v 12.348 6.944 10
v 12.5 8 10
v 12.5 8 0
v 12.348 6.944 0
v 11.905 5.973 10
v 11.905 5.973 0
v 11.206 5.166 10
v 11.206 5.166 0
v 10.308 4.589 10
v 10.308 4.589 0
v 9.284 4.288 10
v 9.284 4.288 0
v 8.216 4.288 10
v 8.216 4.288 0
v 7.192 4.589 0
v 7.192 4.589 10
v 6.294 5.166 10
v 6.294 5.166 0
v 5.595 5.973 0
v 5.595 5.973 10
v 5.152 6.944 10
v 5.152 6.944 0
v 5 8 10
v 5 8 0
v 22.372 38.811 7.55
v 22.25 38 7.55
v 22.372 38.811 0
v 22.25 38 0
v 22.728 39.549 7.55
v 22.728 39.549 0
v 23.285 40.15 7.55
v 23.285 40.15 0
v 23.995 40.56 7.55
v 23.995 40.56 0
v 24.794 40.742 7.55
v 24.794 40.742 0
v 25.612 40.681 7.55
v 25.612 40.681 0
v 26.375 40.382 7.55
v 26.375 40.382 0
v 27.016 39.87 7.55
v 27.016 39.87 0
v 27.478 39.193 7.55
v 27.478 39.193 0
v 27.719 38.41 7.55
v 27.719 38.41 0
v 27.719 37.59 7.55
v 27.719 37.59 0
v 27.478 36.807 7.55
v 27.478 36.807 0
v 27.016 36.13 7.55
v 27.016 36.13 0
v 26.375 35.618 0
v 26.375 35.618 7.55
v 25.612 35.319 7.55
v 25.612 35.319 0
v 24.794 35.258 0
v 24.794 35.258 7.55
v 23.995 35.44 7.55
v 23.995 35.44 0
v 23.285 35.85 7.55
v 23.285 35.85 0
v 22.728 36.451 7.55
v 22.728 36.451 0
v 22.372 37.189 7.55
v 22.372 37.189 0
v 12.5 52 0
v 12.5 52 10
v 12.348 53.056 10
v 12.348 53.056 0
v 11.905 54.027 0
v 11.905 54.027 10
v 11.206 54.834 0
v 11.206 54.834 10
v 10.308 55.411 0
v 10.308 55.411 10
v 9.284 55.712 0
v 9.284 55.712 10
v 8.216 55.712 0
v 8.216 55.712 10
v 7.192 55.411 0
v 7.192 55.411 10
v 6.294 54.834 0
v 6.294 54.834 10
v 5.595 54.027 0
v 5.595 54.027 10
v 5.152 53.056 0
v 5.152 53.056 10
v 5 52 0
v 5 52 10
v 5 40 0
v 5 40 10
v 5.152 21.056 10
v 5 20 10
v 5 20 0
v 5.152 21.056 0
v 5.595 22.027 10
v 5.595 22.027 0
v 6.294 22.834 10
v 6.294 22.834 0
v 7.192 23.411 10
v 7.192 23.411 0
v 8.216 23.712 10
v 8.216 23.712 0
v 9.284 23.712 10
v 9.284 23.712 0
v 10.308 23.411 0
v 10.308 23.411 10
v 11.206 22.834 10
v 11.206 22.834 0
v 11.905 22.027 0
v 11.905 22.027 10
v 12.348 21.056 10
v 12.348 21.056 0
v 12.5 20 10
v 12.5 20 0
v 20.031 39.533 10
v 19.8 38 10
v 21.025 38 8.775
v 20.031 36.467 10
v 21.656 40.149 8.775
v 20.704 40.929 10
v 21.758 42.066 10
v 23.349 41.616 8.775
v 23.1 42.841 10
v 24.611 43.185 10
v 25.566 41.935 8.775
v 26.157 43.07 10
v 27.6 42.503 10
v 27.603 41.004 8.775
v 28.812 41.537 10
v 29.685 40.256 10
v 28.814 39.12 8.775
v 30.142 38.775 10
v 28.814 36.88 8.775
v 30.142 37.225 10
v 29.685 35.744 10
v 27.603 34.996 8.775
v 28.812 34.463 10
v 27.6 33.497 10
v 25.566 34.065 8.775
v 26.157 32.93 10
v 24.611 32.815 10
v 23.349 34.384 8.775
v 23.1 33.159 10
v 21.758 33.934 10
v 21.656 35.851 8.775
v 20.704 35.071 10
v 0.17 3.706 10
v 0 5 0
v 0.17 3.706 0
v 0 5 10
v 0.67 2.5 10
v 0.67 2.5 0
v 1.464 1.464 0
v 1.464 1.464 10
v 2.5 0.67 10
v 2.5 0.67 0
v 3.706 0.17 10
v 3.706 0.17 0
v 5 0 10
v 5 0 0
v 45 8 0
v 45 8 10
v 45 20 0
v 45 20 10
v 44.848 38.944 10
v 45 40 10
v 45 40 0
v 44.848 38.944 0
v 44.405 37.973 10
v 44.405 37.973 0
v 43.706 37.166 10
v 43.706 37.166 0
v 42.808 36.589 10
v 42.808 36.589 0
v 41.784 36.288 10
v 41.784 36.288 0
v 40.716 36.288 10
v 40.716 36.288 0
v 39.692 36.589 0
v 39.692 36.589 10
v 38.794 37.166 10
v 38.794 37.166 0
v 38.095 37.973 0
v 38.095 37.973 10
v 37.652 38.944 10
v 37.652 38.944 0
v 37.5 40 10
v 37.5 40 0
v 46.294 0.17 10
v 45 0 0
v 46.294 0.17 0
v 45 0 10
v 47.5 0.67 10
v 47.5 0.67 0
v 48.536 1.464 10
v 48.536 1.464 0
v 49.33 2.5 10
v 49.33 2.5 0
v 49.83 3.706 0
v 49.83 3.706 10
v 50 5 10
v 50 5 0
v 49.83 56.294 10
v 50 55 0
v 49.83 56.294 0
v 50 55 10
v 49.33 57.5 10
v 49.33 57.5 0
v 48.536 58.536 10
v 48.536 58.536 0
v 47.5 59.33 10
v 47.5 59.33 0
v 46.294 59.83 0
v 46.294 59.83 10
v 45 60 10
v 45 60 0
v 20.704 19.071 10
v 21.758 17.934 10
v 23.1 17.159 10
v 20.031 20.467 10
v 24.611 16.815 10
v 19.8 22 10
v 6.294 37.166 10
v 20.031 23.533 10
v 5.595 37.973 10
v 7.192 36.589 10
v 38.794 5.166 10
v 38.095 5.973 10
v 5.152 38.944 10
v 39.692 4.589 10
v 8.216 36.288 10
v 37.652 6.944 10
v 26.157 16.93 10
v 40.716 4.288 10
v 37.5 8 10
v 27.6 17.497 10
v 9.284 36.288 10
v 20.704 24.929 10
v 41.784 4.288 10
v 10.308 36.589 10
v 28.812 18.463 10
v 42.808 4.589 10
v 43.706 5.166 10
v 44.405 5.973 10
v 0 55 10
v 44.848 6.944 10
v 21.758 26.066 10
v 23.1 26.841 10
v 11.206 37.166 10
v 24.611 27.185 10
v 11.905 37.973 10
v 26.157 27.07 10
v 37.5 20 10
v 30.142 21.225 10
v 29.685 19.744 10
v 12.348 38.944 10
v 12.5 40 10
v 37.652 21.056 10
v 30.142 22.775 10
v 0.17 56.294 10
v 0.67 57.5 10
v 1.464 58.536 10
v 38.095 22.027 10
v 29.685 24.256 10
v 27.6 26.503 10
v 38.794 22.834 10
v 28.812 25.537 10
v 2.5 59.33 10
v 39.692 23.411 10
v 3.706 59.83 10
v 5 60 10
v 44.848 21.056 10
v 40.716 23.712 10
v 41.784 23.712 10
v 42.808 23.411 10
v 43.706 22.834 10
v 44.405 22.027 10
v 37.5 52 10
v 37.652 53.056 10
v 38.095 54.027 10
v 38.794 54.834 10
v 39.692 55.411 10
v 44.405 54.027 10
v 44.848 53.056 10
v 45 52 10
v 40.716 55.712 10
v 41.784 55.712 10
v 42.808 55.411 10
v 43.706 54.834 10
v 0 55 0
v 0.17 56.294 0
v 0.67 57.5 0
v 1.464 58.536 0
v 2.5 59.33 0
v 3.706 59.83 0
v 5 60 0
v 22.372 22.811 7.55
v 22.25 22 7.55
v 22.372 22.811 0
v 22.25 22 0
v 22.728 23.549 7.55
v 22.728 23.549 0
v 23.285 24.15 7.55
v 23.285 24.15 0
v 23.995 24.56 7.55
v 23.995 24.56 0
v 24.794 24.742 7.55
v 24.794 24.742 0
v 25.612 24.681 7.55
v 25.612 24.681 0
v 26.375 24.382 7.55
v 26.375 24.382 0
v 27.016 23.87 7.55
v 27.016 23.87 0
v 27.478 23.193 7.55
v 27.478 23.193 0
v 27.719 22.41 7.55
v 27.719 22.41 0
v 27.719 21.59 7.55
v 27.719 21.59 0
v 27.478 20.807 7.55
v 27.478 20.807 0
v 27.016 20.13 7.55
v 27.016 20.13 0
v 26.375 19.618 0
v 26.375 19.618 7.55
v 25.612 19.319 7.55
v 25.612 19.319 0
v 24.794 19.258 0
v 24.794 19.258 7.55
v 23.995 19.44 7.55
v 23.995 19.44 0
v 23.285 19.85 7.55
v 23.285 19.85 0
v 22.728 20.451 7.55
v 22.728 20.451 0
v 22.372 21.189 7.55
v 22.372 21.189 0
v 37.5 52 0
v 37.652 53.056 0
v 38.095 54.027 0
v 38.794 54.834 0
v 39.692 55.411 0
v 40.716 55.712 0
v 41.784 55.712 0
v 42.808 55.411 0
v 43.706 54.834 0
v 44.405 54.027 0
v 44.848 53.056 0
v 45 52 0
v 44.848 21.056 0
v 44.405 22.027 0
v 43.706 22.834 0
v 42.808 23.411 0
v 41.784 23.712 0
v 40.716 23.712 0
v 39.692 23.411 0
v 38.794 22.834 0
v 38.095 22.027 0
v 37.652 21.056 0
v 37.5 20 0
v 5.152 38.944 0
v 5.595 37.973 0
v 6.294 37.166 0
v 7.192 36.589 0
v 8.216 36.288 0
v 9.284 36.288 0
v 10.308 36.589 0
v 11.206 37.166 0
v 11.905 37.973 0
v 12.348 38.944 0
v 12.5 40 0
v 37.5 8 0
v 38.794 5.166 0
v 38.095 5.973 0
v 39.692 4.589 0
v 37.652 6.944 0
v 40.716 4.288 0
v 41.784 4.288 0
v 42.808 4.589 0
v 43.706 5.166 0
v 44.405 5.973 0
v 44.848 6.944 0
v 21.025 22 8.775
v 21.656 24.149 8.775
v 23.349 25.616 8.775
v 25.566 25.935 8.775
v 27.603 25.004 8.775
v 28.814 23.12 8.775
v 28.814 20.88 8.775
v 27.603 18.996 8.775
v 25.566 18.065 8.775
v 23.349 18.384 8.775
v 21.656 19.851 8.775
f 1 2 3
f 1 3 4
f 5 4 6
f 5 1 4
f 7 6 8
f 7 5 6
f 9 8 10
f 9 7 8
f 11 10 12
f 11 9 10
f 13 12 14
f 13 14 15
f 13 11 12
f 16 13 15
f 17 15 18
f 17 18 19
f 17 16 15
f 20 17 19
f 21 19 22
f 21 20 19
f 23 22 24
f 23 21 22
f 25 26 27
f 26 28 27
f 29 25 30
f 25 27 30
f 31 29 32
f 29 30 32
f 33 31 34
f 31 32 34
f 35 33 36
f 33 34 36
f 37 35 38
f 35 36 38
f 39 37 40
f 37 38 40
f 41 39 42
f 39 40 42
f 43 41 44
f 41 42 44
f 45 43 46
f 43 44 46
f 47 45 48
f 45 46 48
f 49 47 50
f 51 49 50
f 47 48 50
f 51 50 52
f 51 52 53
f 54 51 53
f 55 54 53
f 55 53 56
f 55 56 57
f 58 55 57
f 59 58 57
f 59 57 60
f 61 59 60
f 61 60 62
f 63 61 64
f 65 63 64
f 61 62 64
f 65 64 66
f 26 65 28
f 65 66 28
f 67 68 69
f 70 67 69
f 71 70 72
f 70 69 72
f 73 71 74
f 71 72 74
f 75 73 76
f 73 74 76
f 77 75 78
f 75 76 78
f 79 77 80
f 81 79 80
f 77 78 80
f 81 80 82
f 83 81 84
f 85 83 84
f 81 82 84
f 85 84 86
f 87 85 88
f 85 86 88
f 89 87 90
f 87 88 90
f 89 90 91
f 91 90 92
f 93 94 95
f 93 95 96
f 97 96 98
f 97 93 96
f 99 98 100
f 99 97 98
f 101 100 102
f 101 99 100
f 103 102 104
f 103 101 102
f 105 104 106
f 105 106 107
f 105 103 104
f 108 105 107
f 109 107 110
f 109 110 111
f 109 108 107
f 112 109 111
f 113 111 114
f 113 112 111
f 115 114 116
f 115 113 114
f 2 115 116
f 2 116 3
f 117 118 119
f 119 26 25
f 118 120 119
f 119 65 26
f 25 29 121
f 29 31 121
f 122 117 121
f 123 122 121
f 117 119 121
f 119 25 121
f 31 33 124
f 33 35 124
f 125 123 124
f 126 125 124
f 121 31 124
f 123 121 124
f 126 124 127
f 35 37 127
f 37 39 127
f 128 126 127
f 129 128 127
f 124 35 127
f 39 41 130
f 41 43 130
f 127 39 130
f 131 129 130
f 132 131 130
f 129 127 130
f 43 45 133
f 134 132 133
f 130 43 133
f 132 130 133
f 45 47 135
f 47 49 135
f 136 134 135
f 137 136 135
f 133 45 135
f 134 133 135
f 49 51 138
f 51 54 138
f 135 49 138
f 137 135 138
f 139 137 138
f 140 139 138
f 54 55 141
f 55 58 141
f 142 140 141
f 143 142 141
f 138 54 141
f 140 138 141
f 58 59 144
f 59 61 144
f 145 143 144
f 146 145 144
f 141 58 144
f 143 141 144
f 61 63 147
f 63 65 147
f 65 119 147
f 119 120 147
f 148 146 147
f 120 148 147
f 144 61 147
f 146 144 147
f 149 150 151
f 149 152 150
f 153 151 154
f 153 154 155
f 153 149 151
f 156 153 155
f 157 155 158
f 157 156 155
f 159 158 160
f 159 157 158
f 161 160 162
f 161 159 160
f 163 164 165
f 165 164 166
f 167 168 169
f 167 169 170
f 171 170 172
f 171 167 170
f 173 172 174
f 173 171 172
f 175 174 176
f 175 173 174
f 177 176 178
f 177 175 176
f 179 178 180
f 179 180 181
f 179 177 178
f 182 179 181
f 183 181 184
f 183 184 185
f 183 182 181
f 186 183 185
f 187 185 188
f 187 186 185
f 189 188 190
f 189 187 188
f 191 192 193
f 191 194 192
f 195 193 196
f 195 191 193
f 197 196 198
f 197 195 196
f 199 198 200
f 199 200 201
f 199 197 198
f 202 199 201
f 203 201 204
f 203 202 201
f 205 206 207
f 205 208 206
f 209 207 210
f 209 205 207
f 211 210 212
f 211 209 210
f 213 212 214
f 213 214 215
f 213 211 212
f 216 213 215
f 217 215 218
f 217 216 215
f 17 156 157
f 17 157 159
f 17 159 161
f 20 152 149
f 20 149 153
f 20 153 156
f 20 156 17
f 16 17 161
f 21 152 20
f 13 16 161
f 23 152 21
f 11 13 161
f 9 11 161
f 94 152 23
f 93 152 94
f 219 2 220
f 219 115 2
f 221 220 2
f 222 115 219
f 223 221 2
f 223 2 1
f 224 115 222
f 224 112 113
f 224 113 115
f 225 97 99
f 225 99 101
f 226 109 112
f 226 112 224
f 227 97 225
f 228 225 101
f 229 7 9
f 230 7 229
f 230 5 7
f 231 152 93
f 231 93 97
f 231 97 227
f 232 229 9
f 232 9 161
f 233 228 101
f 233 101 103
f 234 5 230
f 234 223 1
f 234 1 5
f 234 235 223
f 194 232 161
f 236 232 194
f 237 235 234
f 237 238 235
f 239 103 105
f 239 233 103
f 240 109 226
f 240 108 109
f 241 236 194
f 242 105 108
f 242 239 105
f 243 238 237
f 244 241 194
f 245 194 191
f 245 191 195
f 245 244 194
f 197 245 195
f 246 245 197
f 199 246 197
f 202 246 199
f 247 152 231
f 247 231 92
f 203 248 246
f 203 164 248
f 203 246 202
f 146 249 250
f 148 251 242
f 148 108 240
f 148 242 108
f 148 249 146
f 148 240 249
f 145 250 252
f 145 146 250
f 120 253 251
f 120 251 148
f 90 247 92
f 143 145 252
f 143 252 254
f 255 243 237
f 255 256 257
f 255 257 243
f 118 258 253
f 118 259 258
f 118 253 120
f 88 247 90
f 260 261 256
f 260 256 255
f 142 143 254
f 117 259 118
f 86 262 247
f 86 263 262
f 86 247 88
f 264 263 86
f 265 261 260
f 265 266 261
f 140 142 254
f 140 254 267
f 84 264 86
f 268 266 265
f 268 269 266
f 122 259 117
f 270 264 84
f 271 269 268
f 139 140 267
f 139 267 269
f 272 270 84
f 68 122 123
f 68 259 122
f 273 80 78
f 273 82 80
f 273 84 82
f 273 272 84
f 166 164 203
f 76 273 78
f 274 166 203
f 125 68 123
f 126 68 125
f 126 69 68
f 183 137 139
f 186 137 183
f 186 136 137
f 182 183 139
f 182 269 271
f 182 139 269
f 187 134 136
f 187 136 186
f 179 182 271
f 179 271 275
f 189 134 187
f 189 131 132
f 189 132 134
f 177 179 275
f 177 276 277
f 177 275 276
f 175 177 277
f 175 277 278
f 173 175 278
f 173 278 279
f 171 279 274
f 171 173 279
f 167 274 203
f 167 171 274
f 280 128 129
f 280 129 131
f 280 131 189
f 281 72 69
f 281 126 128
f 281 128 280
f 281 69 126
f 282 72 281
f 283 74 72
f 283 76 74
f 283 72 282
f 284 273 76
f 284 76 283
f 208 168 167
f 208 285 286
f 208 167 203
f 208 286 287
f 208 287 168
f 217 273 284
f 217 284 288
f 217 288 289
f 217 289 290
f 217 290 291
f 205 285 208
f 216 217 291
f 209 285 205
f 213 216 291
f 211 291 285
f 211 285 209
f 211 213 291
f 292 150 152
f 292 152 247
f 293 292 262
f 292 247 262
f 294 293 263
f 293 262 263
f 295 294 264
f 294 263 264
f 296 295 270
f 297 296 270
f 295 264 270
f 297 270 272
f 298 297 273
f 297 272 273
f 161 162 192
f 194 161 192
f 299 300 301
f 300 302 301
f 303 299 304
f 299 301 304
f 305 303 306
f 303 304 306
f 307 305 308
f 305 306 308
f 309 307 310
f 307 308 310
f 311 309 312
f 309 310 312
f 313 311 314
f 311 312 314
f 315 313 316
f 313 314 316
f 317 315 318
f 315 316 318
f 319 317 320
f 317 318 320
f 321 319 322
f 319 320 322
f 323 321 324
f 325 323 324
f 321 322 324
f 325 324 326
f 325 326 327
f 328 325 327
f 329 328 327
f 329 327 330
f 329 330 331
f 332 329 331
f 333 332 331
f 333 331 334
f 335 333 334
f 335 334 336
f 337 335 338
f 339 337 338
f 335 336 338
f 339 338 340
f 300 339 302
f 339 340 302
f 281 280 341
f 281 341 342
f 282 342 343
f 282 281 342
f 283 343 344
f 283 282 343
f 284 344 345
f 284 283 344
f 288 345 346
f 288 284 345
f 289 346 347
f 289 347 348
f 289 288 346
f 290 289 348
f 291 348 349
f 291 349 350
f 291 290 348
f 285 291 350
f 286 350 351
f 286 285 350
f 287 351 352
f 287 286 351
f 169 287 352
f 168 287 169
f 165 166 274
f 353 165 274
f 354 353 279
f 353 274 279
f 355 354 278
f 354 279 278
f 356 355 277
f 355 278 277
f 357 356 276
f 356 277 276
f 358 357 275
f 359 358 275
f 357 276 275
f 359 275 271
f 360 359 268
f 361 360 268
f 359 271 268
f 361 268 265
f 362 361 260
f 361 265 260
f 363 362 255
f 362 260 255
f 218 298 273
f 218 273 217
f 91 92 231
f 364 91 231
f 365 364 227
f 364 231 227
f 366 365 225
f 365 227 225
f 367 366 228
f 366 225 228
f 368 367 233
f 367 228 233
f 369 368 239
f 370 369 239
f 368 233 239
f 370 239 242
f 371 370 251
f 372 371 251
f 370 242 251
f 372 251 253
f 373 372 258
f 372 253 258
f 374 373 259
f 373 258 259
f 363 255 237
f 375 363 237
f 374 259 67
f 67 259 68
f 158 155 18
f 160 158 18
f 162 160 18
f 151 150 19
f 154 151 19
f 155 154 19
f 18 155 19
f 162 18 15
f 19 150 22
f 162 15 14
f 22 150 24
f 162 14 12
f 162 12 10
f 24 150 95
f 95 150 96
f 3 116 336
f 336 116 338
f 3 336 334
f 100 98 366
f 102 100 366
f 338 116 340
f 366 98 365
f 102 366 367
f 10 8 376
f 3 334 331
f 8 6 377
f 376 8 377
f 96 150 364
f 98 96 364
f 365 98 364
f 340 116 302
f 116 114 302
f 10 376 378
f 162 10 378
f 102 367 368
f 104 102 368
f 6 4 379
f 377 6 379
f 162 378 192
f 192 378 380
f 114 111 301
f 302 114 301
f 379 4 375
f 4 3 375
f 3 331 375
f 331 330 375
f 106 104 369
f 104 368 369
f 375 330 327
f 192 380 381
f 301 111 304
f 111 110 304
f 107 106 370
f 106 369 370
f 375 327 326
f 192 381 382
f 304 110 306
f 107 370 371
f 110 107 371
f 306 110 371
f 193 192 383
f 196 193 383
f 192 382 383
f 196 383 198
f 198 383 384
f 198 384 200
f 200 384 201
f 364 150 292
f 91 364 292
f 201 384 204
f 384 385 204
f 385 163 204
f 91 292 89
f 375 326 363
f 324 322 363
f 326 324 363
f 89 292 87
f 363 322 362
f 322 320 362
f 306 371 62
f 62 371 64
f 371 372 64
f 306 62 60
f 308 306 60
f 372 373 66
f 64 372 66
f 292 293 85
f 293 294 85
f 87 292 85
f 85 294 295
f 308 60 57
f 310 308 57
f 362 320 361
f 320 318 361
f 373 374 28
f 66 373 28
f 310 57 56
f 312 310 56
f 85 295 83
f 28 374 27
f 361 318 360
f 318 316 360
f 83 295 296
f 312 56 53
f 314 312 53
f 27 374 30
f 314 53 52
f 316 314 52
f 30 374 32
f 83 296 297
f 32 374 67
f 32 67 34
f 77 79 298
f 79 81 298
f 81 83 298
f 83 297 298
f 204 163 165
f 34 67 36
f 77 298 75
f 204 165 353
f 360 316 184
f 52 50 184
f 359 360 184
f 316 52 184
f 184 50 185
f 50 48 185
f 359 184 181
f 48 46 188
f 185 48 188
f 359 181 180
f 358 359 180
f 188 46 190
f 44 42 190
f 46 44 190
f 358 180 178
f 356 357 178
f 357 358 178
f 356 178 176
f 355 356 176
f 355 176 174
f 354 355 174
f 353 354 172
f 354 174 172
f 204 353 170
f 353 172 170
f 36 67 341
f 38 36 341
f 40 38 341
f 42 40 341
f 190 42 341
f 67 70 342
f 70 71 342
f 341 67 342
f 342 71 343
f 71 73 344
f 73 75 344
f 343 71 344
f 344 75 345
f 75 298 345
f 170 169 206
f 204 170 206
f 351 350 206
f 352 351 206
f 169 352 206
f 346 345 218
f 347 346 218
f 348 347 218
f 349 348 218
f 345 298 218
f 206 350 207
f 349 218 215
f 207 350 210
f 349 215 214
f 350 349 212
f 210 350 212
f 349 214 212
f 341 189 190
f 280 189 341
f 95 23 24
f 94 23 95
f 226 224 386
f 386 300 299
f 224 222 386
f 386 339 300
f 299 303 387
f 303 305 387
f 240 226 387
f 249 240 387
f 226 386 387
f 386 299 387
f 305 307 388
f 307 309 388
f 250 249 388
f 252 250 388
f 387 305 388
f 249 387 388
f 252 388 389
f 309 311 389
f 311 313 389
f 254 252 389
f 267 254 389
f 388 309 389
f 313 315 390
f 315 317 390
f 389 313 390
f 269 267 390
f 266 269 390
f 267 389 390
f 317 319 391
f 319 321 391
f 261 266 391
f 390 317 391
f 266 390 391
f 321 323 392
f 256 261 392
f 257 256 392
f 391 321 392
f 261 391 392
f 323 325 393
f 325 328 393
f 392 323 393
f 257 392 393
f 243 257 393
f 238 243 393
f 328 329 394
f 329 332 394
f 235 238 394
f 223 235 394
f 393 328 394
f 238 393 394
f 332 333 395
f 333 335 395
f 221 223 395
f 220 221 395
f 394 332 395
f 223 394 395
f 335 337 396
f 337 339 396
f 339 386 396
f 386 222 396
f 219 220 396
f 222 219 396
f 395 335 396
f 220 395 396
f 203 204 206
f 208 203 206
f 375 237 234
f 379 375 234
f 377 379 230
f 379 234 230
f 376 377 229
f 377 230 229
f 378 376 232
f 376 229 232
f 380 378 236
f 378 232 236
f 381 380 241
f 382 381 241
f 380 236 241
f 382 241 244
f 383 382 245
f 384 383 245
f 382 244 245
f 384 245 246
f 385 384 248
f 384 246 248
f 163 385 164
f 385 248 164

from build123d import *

# Parameters (mm, degrees)
SKETCH1_W                                     = 50
SKETCH1_H                                     = 60
BOSS_EXTRUDE1_DEPTH                           = 10
FILLET1_R                                     = 5
CUT_EXTRUDE1_DEPTH                            = 10
CSK_FOR_M5_COUNTERSUNK_FLAT_HEAD1_D           = 5.5
CSK_FOR_M5_COUNTERSUNK_FLAT_HEAD1_DEPTH       = 30
CSK_FOR_M5_COUNTERSUNK_FLAT_HEAD1_CSINK_D     = 10.4
CSK_FOR_M5_COUNTERSUNK_FLAT_HEAD1_CSINK_ANGLE = 90
CSK_FOR_M5_COUNTERSUNK_FLAT_HEAD1_TIP         = 1.652366702


with BuildPart() as part:
    # Sketch1 → Boss-Extrude1 (new body)
    with BuildSketch(Plane.XY):
        with Locations((25, 30)):
            Rectangle(SKETCH1_W, SKETCH1_H)
    extrude(amount=BOSS_EXTRUDE1_DEPTH)

    # Fillet1
    fillet1_edges = [part.edges().sort_by_distance(p)[0] for p in [
        (0, 60, 5),
        (50, 60, 5),
        (50, 0, 5),
        (0, 0, 5),
    ]]
    fillet(fillet1_edges, radius=FILLET1_R)

    # Sketch2 → Cut-Extrude1 (cut)
    with BuildSketch(Plane.XY.offset(10)):
        with BuildLine():
            Line((12.5, 20), (12.5, 8))
            ThreePointArc((12.5, 8), (8.75, 4.25), (5, 8))
            Line((5, 8), (5, 20))
            ThreePointArc((5, 20), (8.75, 23.75), (12.5, 20))
        make_face()
        with BuildLine():
            Line((37.5, 40), (37.5, 52))
            ThreePointArc((37.5, 52), (41.25, 55.75), (45, 52))
            Line((45, 52), (45, 40))
            ThreePointArc((45, 40), (41.25, 36.25), (37.5, 40))
        make_face()
        with BuildLine():
            Line((37.5, 20), (37.5, 8))
            ThreePointArc((37.5, 8), (41.25, 4.25), (45, 8))
            Line((45, 8), (45, 20))
            ThreePointArc((45, 20), (41.25, 23.75), (37.5, 20))
        make_face()
        with BuildLine():
            Line((12.5, 40), (12.5, 52))
            ThreePointArc((12.5, 52), (8.75, 55.75), (5, 52))
            Line((5, 52), (5, 40))
            ThreePointArc((5, 40), (8.75, 36.25), (12.5, 40))
        make_face()
    extrude(amount=-CUT_EXTRUDE1_DEPTH, mode=Mode.SUBTRACT)

    # CSK for M5 Countersunk Flat Head1
    with Locations(Plane.XY.offset(10)):
        with Locations((25, 38), (25, 22)):
            CounterSinkHole(CSK_FOR_M5_COUNTERSUNK_FLAT_HEAD1_D / 2, CSK_FOR_M5_COUNTERSUNK_FLAT_HEAD1_CSINK_D / 2, depth=CSK_FOR_M5_COUNTERSUNK_FLAT_HEAD1_DEPTH, counter_sink_angle=CSK_FOR_M5_COUNTERSUNK_FLAT_HEAD1_CSINK_ANGLE)
            with Locations((0, 0, -(CSK_FOR_M5_COUNTERSUNK_FLAT_HEAD1_DEPTH + CSK_FOR_M5_COUNTERSUNK_FLAT_HEAD1_TIP / 2))):  # 118° drill point
                Cone(0, CSK_FOR_M5_COUNTERSUNK_FLAT_HEAD1_D / 2, CSK_FOR_M5_COUNTERSUNK_FLAT_HEAD1_TIP, mode=Mode.SUBTRACT)


solid = part.part
